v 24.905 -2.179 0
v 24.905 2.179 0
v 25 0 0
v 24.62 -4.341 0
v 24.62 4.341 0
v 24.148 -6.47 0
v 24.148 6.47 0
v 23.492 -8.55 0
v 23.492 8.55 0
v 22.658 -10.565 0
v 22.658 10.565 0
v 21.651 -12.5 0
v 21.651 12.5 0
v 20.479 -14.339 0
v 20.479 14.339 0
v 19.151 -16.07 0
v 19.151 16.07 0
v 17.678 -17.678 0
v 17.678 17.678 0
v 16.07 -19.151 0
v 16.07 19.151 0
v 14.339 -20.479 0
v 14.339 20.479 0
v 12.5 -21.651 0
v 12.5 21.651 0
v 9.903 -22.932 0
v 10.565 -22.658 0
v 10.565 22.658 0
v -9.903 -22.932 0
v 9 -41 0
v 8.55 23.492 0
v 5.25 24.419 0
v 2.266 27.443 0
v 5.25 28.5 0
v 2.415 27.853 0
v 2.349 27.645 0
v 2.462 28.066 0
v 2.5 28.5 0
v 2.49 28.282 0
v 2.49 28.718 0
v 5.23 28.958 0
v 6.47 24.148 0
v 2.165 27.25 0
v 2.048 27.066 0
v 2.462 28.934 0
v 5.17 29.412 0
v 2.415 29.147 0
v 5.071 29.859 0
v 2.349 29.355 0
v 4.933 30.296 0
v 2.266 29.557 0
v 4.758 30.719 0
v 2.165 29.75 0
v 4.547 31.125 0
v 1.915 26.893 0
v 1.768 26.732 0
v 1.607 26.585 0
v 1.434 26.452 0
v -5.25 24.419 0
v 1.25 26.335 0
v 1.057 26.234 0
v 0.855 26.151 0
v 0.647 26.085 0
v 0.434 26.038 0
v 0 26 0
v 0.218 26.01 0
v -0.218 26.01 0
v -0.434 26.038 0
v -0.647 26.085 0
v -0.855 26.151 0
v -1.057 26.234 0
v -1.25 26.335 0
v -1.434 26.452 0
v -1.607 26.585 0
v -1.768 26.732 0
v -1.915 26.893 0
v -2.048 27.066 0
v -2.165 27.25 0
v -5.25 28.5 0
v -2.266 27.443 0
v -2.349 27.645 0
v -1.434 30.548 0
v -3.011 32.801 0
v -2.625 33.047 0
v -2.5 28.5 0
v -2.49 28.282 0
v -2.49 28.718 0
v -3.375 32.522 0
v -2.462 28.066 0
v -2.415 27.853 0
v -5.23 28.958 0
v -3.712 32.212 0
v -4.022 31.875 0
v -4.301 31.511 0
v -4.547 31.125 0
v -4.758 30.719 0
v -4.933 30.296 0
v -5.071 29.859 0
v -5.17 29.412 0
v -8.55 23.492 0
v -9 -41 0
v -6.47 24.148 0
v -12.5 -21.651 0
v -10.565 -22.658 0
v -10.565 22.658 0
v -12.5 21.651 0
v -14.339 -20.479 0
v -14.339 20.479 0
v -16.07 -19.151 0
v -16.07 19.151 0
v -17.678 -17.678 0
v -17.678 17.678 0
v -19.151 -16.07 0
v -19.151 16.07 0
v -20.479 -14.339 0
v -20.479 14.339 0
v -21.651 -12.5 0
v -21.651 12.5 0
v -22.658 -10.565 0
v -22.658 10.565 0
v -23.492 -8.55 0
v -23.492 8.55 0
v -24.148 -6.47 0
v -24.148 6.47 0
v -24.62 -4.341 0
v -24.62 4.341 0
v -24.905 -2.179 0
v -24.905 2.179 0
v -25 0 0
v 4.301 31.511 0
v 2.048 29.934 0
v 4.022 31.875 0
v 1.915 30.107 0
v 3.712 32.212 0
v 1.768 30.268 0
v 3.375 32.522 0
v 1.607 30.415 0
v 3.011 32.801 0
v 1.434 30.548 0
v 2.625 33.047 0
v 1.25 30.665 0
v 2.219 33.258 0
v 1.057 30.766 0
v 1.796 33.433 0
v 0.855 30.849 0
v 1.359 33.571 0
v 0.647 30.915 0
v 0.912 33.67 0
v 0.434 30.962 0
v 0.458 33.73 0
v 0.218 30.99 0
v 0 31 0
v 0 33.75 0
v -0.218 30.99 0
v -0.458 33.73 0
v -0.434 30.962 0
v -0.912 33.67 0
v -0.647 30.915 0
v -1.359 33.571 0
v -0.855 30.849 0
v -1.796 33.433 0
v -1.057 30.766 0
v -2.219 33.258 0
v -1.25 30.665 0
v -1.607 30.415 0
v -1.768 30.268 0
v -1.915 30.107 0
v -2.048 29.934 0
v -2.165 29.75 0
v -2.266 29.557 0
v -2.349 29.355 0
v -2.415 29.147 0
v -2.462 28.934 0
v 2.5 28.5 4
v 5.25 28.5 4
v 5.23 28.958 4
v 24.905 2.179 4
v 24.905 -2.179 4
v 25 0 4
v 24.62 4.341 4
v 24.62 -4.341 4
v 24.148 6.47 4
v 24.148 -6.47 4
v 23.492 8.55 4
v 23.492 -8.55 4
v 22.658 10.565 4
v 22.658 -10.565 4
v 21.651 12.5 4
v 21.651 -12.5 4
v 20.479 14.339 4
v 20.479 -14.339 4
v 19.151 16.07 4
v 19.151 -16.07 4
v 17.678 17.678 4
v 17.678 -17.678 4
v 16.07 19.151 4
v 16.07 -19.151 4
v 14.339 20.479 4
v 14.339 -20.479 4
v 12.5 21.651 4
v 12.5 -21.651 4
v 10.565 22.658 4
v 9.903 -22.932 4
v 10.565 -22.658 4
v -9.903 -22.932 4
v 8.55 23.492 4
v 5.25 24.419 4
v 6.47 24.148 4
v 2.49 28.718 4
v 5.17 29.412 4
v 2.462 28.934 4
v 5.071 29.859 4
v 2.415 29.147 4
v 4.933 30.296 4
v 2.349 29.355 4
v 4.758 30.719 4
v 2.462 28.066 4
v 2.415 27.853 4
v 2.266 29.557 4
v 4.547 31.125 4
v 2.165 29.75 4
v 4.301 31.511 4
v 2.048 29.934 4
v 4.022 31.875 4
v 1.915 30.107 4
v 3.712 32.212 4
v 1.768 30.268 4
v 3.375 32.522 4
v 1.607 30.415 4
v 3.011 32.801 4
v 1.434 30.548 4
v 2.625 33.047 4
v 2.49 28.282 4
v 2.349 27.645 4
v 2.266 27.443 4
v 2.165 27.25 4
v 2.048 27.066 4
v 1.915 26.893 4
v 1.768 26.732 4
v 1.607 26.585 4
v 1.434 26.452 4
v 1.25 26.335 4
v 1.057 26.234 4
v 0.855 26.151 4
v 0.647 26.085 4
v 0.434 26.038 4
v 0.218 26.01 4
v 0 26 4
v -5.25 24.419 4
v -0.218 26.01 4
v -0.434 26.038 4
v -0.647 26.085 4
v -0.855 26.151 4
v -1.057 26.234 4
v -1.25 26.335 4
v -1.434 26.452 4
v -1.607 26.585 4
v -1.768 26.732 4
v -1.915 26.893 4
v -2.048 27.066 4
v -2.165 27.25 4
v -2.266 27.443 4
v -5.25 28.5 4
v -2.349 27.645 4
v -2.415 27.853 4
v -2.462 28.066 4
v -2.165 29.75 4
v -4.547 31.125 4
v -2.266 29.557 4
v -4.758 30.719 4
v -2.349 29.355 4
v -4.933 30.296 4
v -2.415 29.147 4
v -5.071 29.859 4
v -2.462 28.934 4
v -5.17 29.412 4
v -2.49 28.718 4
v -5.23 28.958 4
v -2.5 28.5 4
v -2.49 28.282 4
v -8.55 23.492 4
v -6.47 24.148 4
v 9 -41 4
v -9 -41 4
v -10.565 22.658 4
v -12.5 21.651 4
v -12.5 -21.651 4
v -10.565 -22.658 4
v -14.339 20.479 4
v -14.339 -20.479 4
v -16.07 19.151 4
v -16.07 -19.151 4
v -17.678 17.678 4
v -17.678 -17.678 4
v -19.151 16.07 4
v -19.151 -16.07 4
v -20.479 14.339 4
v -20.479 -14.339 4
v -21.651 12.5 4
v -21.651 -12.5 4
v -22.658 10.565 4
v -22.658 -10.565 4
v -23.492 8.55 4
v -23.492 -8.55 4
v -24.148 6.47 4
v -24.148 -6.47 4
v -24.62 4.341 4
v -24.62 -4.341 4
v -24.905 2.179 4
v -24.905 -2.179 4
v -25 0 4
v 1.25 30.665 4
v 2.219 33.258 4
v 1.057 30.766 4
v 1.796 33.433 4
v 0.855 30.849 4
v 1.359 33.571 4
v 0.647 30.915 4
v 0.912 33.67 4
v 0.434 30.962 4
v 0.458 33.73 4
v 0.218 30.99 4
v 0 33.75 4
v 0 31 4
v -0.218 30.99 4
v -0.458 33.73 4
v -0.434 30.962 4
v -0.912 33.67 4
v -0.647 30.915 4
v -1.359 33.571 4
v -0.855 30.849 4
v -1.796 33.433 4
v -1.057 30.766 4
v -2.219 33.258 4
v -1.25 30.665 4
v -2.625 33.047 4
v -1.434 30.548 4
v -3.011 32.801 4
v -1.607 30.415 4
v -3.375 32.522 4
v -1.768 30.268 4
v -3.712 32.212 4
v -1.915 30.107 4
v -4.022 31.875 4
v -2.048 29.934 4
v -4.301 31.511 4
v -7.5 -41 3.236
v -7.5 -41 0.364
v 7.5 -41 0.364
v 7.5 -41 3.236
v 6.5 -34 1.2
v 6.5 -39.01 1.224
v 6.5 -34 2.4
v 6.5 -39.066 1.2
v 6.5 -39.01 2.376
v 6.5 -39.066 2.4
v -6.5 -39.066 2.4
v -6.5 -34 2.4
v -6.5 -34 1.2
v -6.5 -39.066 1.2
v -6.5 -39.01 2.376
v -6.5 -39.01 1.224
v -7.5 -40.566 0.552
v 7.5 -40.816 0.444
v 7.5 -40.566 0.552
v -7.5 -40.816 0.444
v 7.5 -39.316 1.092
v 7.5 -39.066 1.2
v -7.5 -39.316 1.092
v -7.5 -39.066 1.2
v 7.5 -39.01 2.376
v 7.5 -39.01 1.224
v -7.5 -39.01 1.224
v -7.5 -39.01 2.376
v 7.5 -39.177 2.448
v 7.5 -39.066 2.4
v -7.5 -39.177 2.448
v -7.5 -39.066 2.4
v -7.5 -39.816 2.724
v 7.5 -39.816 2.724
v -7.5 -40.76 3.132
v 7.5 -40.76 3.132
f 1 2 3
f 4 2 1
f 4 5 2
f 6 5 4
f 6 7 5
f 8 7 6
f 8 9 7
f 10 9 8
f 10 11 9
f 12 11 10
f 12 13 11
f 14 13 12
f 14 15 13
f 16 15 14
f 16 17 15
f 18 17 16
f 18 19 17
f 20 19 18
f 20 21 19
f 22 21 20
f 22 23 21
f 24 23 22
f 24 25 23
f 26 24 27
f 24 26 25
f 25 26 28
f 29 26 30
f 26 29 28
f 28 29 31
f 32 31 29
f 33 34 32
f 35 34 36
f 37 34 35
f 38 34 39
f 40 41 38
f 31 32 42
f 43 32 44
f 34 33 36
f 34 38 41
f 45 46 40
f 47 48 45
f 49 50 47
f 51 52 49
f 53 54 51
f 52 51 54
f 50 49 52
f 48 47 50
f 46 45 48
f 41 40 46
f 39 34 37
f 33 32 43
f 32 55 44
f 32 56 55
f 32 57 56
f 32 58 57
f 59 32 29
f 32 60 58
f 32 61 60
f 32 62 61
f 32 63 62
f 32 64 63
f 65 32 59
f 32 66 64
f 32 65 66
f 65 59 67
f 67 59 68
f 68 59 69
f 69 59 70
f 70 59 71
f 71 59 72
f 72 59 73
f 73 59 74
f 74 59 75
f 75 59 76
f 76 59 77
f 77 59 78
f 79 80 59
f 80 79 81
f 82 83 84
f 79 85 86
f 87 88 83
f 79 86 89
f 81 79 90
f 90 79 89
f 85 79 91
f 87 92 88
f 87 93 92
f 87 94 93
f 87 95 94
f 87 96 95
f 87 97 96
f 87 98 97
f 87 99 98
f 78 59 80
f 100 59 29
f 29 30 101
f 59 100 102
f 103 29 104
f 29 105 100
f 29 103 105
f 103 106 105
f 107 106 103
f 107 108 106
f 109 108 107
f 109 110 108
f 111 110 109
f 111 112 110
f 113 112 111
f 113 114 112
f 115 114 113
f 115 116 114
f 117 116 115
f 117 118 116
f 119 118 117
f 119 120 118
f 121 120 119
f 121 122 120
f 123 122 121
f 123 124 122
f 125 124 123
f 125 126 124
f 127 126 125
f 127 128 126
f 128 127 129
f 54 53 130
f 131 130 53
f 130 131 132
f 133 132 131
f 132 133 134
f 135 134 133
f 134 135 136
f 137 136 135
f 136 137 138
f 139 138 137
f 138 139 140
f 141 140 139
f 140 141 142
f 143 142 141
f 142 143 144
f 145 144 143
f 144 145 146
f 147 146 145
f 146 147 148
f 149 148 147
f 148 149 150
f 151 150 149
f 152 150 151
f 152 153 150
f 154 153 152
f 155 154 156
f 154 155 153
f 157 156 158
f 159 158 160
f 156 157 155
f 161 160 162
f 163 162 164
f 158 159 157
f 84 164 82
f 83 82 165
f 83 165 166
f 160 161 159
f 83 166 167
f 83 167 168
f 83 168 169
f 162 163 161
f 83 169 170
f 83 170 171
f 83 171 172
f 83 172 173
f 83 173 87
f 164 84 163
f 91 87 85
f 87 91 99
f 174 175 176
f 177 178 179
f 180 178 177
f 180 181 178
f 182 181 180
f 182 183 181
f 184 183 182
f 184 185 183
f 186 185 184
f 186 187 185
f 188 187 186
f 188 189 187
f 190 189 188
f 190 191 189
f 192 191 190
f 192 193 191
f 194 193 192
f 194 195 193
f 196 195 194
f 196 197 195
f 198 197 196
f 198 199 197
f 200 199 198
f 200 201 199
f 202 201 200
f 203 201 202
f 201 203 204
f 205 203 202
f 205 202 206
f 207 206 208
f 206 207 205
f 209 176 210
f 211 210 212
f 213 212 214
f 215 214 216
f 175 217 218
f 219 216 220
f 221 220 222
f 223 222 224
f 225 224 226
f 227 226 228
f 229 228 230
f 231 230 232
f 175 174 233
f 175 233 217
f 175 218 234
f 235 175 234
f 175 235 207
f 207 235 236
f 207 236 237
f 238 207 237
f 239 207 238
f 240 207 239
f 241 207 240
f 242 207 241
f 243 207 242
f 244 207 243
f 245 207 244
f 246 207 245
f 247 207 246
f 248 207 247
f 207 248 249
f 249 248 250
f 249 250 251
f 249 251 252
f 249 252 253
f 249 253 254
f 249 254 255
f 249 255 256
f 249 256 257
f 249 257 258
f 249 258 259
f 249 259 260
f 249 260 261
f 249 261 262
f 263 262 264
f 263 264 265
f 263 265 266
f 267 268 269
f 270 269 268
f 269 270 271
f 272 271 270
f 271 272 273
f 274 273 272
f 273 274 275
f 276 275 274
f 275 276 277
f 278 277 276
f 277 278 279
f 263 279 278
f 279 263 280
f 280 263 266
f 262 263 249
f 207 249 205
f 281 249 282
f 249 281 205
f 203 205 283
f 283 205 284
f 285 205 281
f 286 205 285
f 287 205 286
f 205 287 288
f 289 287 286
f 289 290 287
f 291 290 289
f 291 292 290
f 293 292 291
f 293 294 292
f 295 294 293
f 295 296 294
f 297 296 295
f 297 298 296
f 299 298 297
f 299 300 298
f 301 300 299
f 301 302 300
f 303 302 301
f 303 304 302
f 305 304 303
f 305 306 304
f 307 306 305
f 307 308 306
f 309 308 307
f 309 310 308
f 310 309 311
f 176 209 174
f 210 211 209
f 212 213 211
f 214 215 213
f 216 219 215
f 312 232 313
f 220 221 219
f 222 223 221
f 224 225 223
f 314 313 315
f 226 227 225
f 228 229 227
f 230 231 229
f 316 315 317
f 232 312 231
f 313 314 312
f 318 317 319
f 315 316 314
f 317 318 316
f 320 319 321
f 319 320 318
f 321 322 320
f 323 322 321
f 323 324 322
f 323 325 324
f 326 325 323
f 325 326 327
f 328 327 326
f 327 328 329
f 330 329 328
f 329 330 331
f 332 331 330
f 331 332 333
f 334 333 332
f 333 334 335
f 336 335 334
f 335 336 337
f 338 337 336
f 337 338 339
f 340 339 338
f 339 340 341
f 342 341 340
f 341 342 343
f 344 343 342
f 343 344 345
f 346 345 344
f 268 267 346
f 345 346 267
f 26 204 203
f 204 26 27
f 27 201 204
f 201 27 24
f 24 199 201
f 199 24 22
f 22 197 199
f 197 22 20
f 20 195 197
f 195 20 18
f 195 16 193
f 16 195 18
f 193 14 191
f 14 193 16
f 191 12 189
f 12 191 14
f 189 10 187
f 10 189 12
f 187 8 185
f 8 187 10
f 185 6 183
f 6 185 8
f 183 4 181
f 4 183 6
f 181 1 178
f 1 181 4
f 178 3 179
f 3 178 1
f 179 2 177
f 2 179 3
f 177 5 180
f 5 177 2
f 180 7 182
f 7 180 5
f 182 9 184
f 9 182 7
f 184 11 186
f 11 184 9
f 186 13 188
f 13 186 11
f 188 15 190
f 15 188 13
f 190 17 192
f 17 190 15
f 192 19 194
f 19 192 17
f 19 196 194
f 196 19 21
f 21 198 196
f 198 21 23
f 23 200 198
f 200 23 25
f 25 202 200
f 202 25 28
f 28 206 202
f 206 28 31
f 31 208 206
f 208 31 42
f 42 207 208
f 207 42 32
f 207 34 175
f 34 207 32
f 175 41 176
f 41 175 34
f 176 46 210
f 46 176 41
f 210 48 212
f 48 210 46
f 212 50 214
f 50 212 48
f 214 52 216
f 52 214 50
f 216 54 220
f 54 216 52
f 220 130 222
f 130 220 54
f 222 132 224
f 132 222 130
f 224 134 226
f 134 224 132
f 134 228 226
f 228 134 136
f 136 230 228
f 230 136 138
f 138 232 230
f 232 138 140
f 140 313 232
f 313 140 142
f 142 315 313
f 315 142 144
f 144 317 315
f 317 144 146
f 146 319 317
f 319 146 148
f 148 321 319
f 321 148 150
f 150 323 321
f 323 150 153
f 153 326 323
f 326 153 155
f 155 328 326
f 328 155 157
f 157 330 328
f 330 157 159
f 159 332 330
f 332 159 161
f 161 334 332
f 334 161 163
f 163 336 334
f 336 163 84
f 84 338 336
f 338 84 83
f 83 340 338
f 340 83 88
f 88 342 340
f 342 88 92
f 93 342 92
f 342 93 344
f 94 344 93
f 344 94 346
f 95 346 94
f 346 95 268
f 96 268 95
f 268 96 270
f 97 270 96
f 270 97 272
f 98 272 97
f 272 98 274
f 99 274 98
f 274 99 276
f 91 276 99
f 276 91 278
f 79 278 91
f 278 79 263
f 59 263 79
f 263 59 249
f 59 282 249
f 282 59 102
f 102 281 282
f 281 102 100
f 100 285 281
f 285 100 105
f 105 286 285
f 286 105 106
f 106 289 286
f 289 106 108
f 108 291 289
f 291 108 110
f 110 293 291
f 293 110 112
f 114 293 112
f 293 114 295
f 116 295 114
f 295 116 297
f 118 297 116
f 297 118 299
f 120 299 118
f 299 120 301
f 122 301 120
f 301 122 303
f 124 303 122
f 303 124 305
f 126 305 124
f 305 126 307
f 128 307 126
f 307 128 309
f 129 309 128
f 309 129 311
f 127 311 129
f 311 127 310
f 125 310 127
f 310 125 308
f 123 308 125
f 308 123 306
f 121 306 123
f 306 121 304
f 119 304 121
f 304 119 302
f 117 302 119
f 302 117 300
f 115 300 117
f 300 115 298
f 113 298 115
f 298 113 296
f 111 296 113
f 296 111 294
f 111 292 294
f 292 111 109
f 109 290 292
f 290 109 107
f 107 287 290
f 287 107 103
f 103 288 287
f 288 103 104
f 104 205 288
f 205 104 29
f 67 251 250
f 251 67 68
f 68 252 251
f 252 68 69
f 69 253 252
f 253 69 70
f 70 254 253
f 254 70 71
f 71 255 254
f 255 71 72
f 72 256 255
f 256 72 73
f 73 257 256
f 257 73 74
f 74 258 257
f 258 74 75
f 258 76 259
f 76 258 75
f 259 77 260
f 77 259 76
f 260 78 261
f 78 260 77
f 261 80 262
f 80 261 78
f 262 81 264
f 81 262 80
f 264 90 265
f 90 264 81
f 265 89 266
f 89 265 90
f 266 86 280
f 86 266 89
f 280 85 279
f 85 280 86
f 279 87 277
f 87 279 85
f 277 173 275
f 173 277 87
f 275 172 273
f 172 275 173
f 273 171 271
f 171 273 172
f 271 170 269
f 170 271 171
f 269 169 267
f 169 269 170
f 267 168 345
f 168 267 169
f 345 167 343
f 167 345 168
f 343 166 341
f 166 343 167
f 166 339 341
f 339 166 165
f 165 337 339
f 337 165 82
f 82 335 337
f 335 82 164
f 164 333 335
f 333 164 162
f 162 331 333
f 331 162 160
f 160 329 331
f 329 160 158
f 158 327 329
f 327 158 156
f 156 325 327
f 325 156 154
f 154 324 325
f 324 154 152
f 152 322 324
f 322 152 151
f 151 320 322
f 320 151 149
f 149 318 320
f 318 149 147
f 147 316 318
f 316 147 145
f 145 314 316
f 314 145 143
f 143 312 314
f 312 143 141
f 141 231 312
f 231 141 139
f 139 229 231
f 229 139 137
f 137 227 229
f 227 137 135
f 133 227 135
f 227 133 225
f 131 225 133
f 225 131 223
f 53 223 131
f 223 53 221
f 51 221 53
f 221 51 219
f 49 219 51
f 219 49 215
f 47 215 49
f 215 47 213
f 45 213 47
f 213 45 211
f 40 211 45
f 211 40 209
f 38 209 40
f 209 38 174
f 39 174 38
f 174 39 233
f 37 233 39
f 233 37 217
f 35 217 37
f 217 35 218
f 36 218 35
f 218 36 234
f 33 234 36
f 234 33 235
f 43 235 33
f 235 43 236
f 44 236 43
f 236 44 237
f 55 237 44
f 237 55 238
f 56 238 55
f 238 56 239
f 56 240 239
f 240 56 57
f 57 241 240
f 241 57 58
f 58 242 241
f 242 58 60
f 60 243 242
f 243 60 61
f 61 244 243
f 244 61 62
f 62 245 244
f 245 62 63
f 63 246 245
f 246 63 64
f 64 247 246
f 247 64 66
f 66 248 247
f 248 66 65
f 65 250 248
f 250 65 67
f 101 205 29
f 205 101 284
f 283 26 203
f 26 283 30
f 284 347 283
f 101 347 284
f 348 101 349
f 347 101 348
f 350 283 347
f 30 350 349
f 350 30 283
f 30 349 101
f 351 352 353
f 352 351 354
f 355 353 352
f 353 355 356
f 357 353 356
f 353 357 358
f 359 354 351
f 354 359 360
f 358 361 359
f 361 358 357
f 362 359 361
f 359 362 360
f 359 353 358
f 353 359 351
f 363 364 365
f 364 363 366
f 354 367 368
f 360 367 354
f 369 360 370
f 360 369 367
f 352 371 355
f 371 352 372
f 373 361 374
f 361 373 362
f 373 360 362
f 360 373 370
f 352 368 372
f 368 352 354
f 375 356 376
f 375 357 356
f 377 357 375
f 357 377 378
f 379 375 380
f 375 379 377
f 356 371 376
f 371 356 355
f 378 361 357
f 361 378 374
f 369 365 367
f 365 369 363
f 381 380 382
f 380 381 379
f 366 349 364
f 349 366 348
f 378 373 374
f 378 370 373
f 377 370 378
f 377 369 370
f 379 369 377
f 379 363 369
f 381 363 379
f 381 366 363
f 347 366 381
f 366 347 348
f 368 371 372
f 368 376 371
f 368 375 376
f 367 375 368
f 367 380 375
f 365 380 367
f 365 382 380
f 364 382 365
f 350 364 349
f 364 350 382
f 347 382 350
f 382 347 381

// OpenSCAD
// Chaveiro abridor de lata no FORMATO DO SÍMBOLO enviado — modelo próprio do Multiferramenta 3D
// Peças: "base" (cor 1: corpo no formato do símbolo + argola + ponta abridora) e "detalhes" (cor 2: desenho embutido no topo).
// Abridor: na ponta, uma FENDA horizontal (tipo boca de pregador). A mandíbula de baixo, fina e chanfrada,
// escorrega por baixo da tampinha; a ponta da tampinha entra na fenda e, girando o chaveiro, ela levanta.
tamanho = 50;             // maior medida do símbolo (mm)
espessura = 4;
aro = 2;                  // borda lisa em volta do desenho
logo = []; lw = 60; lh = 60;
silhueta = [];            // contorno de fora do símbolo (mesma escala do desenho)
formato = "contorno";     // contorno | redondo
furo = 5;                 // furo da argola
fenda_larg = 13;          // largura da fenda (a tampinha tem ~10–11 mm)
fenda_alt = 1.2;          // altura da fenda
fenda_fundo = 7;          // profundidade da fenda
parte = "base";
$fn = 72;

RELEVO = 0.8;
k = (tamanho - 2 * aro) / max(lw, lh);
usa_contorno = formato == "contorno" && len(silhueta) > 0;
module poligonos(ps) for (p = ps) polygon(points = p[0], paths = p[1]);
module corpo2d() { if (usa_contorno) offset(r = aro) scale([k, k]) poligonos(silhueta); else circle(d = tamanho); }
// altura do símbolo (pra posicionar argola e ponta)
H = usa_contorno ? lh * k + 2 * aro : tamanho;
W = usa_contorno ? lw * k + 2 * aro : tamanho;

// argola: orelha no topo do símbolo
module argola2d() difference() {
  hull() { translate([0, H / 2 + furo / 2 + 1]) circle(d = furo + 5.5); translate([0, H / 2 - 5]) circle(d = furo + 5.5); }
  translate([0, H / 2 + furo / 2 + 1]) circle(d = furo);
}
// ponta abridora: língua que sai de baixo do símbolo
LINGUA_L = 16; LINGUA_W = fenda_larg + 7;
module lingua3d() hull() {
  translate([-LINGUA_W / 2, -H / 2 + 4, 0]) cube([LINGUA_W, 1, espessura]);
  translate([-LINGUA_W / 2 + 1, -H / 2 - LINGUA_L, 0]) cube([LINGUA_W - 2, 1, espessura]);
}
// fenda na ponta (aberta pra frente) + chanfro embaixo da mandíbula de baixo (escorrega por baixo da tampinha)
z_fenda = 1.2;
module fenda3d() {
  translate([-fenda_larg / 2, -H / 2 - LINGUA_L - 1, z_fenda]) cube([fenda_larg, fenda_fundo + 1, fenda_alt]);
  // entrada da fenda alargada (funil), pra tampinha achar o caminho
  translate([0, -H / 2 - LINGUA_L - 0.01, z_fenda + fenda_alt / 2]) rotate([-90, 0, 0])
    linear_extrude(2, scale = [1, 0.4]) square([fenda_larg + 2, fenda_alt * 2.4], center = true);
  // chanfro da mandíbula de baixo: a ponta fica com ~0,4 mm
  translate([-LINGUA_W, -H / 2 - LINGUA_L - 1, 0]) rotate([-atan((z_fenda - 0.4) / 5), 0, 0]) translate([0, 0, -10]) cube([2 * LINGUA_W, 6, 10]);
}

module desenho2d() intersection() { offset(r = -0.4) corpo2d(); scale([k, k]) poligonos(logo); }
module detalhes() translate([0, 0, espessura - RELEVO]) linear_extrude(RELEVO) desenho2d();
module recorte_desenho() translate([0, 0, espessura - RELEVO]) linear_extrude(RELEVO + 1) desenho2d();

module corpo() difference() {
  union() { linear_extrude(espessura) union() { corpo2d(); argola2d(); } lingua3d(); }
  fenda3d();
}

if (parte == "base") difference() { corpo(); recorte_desenho(); }
else if (parte == "detalhes") detalhes();
